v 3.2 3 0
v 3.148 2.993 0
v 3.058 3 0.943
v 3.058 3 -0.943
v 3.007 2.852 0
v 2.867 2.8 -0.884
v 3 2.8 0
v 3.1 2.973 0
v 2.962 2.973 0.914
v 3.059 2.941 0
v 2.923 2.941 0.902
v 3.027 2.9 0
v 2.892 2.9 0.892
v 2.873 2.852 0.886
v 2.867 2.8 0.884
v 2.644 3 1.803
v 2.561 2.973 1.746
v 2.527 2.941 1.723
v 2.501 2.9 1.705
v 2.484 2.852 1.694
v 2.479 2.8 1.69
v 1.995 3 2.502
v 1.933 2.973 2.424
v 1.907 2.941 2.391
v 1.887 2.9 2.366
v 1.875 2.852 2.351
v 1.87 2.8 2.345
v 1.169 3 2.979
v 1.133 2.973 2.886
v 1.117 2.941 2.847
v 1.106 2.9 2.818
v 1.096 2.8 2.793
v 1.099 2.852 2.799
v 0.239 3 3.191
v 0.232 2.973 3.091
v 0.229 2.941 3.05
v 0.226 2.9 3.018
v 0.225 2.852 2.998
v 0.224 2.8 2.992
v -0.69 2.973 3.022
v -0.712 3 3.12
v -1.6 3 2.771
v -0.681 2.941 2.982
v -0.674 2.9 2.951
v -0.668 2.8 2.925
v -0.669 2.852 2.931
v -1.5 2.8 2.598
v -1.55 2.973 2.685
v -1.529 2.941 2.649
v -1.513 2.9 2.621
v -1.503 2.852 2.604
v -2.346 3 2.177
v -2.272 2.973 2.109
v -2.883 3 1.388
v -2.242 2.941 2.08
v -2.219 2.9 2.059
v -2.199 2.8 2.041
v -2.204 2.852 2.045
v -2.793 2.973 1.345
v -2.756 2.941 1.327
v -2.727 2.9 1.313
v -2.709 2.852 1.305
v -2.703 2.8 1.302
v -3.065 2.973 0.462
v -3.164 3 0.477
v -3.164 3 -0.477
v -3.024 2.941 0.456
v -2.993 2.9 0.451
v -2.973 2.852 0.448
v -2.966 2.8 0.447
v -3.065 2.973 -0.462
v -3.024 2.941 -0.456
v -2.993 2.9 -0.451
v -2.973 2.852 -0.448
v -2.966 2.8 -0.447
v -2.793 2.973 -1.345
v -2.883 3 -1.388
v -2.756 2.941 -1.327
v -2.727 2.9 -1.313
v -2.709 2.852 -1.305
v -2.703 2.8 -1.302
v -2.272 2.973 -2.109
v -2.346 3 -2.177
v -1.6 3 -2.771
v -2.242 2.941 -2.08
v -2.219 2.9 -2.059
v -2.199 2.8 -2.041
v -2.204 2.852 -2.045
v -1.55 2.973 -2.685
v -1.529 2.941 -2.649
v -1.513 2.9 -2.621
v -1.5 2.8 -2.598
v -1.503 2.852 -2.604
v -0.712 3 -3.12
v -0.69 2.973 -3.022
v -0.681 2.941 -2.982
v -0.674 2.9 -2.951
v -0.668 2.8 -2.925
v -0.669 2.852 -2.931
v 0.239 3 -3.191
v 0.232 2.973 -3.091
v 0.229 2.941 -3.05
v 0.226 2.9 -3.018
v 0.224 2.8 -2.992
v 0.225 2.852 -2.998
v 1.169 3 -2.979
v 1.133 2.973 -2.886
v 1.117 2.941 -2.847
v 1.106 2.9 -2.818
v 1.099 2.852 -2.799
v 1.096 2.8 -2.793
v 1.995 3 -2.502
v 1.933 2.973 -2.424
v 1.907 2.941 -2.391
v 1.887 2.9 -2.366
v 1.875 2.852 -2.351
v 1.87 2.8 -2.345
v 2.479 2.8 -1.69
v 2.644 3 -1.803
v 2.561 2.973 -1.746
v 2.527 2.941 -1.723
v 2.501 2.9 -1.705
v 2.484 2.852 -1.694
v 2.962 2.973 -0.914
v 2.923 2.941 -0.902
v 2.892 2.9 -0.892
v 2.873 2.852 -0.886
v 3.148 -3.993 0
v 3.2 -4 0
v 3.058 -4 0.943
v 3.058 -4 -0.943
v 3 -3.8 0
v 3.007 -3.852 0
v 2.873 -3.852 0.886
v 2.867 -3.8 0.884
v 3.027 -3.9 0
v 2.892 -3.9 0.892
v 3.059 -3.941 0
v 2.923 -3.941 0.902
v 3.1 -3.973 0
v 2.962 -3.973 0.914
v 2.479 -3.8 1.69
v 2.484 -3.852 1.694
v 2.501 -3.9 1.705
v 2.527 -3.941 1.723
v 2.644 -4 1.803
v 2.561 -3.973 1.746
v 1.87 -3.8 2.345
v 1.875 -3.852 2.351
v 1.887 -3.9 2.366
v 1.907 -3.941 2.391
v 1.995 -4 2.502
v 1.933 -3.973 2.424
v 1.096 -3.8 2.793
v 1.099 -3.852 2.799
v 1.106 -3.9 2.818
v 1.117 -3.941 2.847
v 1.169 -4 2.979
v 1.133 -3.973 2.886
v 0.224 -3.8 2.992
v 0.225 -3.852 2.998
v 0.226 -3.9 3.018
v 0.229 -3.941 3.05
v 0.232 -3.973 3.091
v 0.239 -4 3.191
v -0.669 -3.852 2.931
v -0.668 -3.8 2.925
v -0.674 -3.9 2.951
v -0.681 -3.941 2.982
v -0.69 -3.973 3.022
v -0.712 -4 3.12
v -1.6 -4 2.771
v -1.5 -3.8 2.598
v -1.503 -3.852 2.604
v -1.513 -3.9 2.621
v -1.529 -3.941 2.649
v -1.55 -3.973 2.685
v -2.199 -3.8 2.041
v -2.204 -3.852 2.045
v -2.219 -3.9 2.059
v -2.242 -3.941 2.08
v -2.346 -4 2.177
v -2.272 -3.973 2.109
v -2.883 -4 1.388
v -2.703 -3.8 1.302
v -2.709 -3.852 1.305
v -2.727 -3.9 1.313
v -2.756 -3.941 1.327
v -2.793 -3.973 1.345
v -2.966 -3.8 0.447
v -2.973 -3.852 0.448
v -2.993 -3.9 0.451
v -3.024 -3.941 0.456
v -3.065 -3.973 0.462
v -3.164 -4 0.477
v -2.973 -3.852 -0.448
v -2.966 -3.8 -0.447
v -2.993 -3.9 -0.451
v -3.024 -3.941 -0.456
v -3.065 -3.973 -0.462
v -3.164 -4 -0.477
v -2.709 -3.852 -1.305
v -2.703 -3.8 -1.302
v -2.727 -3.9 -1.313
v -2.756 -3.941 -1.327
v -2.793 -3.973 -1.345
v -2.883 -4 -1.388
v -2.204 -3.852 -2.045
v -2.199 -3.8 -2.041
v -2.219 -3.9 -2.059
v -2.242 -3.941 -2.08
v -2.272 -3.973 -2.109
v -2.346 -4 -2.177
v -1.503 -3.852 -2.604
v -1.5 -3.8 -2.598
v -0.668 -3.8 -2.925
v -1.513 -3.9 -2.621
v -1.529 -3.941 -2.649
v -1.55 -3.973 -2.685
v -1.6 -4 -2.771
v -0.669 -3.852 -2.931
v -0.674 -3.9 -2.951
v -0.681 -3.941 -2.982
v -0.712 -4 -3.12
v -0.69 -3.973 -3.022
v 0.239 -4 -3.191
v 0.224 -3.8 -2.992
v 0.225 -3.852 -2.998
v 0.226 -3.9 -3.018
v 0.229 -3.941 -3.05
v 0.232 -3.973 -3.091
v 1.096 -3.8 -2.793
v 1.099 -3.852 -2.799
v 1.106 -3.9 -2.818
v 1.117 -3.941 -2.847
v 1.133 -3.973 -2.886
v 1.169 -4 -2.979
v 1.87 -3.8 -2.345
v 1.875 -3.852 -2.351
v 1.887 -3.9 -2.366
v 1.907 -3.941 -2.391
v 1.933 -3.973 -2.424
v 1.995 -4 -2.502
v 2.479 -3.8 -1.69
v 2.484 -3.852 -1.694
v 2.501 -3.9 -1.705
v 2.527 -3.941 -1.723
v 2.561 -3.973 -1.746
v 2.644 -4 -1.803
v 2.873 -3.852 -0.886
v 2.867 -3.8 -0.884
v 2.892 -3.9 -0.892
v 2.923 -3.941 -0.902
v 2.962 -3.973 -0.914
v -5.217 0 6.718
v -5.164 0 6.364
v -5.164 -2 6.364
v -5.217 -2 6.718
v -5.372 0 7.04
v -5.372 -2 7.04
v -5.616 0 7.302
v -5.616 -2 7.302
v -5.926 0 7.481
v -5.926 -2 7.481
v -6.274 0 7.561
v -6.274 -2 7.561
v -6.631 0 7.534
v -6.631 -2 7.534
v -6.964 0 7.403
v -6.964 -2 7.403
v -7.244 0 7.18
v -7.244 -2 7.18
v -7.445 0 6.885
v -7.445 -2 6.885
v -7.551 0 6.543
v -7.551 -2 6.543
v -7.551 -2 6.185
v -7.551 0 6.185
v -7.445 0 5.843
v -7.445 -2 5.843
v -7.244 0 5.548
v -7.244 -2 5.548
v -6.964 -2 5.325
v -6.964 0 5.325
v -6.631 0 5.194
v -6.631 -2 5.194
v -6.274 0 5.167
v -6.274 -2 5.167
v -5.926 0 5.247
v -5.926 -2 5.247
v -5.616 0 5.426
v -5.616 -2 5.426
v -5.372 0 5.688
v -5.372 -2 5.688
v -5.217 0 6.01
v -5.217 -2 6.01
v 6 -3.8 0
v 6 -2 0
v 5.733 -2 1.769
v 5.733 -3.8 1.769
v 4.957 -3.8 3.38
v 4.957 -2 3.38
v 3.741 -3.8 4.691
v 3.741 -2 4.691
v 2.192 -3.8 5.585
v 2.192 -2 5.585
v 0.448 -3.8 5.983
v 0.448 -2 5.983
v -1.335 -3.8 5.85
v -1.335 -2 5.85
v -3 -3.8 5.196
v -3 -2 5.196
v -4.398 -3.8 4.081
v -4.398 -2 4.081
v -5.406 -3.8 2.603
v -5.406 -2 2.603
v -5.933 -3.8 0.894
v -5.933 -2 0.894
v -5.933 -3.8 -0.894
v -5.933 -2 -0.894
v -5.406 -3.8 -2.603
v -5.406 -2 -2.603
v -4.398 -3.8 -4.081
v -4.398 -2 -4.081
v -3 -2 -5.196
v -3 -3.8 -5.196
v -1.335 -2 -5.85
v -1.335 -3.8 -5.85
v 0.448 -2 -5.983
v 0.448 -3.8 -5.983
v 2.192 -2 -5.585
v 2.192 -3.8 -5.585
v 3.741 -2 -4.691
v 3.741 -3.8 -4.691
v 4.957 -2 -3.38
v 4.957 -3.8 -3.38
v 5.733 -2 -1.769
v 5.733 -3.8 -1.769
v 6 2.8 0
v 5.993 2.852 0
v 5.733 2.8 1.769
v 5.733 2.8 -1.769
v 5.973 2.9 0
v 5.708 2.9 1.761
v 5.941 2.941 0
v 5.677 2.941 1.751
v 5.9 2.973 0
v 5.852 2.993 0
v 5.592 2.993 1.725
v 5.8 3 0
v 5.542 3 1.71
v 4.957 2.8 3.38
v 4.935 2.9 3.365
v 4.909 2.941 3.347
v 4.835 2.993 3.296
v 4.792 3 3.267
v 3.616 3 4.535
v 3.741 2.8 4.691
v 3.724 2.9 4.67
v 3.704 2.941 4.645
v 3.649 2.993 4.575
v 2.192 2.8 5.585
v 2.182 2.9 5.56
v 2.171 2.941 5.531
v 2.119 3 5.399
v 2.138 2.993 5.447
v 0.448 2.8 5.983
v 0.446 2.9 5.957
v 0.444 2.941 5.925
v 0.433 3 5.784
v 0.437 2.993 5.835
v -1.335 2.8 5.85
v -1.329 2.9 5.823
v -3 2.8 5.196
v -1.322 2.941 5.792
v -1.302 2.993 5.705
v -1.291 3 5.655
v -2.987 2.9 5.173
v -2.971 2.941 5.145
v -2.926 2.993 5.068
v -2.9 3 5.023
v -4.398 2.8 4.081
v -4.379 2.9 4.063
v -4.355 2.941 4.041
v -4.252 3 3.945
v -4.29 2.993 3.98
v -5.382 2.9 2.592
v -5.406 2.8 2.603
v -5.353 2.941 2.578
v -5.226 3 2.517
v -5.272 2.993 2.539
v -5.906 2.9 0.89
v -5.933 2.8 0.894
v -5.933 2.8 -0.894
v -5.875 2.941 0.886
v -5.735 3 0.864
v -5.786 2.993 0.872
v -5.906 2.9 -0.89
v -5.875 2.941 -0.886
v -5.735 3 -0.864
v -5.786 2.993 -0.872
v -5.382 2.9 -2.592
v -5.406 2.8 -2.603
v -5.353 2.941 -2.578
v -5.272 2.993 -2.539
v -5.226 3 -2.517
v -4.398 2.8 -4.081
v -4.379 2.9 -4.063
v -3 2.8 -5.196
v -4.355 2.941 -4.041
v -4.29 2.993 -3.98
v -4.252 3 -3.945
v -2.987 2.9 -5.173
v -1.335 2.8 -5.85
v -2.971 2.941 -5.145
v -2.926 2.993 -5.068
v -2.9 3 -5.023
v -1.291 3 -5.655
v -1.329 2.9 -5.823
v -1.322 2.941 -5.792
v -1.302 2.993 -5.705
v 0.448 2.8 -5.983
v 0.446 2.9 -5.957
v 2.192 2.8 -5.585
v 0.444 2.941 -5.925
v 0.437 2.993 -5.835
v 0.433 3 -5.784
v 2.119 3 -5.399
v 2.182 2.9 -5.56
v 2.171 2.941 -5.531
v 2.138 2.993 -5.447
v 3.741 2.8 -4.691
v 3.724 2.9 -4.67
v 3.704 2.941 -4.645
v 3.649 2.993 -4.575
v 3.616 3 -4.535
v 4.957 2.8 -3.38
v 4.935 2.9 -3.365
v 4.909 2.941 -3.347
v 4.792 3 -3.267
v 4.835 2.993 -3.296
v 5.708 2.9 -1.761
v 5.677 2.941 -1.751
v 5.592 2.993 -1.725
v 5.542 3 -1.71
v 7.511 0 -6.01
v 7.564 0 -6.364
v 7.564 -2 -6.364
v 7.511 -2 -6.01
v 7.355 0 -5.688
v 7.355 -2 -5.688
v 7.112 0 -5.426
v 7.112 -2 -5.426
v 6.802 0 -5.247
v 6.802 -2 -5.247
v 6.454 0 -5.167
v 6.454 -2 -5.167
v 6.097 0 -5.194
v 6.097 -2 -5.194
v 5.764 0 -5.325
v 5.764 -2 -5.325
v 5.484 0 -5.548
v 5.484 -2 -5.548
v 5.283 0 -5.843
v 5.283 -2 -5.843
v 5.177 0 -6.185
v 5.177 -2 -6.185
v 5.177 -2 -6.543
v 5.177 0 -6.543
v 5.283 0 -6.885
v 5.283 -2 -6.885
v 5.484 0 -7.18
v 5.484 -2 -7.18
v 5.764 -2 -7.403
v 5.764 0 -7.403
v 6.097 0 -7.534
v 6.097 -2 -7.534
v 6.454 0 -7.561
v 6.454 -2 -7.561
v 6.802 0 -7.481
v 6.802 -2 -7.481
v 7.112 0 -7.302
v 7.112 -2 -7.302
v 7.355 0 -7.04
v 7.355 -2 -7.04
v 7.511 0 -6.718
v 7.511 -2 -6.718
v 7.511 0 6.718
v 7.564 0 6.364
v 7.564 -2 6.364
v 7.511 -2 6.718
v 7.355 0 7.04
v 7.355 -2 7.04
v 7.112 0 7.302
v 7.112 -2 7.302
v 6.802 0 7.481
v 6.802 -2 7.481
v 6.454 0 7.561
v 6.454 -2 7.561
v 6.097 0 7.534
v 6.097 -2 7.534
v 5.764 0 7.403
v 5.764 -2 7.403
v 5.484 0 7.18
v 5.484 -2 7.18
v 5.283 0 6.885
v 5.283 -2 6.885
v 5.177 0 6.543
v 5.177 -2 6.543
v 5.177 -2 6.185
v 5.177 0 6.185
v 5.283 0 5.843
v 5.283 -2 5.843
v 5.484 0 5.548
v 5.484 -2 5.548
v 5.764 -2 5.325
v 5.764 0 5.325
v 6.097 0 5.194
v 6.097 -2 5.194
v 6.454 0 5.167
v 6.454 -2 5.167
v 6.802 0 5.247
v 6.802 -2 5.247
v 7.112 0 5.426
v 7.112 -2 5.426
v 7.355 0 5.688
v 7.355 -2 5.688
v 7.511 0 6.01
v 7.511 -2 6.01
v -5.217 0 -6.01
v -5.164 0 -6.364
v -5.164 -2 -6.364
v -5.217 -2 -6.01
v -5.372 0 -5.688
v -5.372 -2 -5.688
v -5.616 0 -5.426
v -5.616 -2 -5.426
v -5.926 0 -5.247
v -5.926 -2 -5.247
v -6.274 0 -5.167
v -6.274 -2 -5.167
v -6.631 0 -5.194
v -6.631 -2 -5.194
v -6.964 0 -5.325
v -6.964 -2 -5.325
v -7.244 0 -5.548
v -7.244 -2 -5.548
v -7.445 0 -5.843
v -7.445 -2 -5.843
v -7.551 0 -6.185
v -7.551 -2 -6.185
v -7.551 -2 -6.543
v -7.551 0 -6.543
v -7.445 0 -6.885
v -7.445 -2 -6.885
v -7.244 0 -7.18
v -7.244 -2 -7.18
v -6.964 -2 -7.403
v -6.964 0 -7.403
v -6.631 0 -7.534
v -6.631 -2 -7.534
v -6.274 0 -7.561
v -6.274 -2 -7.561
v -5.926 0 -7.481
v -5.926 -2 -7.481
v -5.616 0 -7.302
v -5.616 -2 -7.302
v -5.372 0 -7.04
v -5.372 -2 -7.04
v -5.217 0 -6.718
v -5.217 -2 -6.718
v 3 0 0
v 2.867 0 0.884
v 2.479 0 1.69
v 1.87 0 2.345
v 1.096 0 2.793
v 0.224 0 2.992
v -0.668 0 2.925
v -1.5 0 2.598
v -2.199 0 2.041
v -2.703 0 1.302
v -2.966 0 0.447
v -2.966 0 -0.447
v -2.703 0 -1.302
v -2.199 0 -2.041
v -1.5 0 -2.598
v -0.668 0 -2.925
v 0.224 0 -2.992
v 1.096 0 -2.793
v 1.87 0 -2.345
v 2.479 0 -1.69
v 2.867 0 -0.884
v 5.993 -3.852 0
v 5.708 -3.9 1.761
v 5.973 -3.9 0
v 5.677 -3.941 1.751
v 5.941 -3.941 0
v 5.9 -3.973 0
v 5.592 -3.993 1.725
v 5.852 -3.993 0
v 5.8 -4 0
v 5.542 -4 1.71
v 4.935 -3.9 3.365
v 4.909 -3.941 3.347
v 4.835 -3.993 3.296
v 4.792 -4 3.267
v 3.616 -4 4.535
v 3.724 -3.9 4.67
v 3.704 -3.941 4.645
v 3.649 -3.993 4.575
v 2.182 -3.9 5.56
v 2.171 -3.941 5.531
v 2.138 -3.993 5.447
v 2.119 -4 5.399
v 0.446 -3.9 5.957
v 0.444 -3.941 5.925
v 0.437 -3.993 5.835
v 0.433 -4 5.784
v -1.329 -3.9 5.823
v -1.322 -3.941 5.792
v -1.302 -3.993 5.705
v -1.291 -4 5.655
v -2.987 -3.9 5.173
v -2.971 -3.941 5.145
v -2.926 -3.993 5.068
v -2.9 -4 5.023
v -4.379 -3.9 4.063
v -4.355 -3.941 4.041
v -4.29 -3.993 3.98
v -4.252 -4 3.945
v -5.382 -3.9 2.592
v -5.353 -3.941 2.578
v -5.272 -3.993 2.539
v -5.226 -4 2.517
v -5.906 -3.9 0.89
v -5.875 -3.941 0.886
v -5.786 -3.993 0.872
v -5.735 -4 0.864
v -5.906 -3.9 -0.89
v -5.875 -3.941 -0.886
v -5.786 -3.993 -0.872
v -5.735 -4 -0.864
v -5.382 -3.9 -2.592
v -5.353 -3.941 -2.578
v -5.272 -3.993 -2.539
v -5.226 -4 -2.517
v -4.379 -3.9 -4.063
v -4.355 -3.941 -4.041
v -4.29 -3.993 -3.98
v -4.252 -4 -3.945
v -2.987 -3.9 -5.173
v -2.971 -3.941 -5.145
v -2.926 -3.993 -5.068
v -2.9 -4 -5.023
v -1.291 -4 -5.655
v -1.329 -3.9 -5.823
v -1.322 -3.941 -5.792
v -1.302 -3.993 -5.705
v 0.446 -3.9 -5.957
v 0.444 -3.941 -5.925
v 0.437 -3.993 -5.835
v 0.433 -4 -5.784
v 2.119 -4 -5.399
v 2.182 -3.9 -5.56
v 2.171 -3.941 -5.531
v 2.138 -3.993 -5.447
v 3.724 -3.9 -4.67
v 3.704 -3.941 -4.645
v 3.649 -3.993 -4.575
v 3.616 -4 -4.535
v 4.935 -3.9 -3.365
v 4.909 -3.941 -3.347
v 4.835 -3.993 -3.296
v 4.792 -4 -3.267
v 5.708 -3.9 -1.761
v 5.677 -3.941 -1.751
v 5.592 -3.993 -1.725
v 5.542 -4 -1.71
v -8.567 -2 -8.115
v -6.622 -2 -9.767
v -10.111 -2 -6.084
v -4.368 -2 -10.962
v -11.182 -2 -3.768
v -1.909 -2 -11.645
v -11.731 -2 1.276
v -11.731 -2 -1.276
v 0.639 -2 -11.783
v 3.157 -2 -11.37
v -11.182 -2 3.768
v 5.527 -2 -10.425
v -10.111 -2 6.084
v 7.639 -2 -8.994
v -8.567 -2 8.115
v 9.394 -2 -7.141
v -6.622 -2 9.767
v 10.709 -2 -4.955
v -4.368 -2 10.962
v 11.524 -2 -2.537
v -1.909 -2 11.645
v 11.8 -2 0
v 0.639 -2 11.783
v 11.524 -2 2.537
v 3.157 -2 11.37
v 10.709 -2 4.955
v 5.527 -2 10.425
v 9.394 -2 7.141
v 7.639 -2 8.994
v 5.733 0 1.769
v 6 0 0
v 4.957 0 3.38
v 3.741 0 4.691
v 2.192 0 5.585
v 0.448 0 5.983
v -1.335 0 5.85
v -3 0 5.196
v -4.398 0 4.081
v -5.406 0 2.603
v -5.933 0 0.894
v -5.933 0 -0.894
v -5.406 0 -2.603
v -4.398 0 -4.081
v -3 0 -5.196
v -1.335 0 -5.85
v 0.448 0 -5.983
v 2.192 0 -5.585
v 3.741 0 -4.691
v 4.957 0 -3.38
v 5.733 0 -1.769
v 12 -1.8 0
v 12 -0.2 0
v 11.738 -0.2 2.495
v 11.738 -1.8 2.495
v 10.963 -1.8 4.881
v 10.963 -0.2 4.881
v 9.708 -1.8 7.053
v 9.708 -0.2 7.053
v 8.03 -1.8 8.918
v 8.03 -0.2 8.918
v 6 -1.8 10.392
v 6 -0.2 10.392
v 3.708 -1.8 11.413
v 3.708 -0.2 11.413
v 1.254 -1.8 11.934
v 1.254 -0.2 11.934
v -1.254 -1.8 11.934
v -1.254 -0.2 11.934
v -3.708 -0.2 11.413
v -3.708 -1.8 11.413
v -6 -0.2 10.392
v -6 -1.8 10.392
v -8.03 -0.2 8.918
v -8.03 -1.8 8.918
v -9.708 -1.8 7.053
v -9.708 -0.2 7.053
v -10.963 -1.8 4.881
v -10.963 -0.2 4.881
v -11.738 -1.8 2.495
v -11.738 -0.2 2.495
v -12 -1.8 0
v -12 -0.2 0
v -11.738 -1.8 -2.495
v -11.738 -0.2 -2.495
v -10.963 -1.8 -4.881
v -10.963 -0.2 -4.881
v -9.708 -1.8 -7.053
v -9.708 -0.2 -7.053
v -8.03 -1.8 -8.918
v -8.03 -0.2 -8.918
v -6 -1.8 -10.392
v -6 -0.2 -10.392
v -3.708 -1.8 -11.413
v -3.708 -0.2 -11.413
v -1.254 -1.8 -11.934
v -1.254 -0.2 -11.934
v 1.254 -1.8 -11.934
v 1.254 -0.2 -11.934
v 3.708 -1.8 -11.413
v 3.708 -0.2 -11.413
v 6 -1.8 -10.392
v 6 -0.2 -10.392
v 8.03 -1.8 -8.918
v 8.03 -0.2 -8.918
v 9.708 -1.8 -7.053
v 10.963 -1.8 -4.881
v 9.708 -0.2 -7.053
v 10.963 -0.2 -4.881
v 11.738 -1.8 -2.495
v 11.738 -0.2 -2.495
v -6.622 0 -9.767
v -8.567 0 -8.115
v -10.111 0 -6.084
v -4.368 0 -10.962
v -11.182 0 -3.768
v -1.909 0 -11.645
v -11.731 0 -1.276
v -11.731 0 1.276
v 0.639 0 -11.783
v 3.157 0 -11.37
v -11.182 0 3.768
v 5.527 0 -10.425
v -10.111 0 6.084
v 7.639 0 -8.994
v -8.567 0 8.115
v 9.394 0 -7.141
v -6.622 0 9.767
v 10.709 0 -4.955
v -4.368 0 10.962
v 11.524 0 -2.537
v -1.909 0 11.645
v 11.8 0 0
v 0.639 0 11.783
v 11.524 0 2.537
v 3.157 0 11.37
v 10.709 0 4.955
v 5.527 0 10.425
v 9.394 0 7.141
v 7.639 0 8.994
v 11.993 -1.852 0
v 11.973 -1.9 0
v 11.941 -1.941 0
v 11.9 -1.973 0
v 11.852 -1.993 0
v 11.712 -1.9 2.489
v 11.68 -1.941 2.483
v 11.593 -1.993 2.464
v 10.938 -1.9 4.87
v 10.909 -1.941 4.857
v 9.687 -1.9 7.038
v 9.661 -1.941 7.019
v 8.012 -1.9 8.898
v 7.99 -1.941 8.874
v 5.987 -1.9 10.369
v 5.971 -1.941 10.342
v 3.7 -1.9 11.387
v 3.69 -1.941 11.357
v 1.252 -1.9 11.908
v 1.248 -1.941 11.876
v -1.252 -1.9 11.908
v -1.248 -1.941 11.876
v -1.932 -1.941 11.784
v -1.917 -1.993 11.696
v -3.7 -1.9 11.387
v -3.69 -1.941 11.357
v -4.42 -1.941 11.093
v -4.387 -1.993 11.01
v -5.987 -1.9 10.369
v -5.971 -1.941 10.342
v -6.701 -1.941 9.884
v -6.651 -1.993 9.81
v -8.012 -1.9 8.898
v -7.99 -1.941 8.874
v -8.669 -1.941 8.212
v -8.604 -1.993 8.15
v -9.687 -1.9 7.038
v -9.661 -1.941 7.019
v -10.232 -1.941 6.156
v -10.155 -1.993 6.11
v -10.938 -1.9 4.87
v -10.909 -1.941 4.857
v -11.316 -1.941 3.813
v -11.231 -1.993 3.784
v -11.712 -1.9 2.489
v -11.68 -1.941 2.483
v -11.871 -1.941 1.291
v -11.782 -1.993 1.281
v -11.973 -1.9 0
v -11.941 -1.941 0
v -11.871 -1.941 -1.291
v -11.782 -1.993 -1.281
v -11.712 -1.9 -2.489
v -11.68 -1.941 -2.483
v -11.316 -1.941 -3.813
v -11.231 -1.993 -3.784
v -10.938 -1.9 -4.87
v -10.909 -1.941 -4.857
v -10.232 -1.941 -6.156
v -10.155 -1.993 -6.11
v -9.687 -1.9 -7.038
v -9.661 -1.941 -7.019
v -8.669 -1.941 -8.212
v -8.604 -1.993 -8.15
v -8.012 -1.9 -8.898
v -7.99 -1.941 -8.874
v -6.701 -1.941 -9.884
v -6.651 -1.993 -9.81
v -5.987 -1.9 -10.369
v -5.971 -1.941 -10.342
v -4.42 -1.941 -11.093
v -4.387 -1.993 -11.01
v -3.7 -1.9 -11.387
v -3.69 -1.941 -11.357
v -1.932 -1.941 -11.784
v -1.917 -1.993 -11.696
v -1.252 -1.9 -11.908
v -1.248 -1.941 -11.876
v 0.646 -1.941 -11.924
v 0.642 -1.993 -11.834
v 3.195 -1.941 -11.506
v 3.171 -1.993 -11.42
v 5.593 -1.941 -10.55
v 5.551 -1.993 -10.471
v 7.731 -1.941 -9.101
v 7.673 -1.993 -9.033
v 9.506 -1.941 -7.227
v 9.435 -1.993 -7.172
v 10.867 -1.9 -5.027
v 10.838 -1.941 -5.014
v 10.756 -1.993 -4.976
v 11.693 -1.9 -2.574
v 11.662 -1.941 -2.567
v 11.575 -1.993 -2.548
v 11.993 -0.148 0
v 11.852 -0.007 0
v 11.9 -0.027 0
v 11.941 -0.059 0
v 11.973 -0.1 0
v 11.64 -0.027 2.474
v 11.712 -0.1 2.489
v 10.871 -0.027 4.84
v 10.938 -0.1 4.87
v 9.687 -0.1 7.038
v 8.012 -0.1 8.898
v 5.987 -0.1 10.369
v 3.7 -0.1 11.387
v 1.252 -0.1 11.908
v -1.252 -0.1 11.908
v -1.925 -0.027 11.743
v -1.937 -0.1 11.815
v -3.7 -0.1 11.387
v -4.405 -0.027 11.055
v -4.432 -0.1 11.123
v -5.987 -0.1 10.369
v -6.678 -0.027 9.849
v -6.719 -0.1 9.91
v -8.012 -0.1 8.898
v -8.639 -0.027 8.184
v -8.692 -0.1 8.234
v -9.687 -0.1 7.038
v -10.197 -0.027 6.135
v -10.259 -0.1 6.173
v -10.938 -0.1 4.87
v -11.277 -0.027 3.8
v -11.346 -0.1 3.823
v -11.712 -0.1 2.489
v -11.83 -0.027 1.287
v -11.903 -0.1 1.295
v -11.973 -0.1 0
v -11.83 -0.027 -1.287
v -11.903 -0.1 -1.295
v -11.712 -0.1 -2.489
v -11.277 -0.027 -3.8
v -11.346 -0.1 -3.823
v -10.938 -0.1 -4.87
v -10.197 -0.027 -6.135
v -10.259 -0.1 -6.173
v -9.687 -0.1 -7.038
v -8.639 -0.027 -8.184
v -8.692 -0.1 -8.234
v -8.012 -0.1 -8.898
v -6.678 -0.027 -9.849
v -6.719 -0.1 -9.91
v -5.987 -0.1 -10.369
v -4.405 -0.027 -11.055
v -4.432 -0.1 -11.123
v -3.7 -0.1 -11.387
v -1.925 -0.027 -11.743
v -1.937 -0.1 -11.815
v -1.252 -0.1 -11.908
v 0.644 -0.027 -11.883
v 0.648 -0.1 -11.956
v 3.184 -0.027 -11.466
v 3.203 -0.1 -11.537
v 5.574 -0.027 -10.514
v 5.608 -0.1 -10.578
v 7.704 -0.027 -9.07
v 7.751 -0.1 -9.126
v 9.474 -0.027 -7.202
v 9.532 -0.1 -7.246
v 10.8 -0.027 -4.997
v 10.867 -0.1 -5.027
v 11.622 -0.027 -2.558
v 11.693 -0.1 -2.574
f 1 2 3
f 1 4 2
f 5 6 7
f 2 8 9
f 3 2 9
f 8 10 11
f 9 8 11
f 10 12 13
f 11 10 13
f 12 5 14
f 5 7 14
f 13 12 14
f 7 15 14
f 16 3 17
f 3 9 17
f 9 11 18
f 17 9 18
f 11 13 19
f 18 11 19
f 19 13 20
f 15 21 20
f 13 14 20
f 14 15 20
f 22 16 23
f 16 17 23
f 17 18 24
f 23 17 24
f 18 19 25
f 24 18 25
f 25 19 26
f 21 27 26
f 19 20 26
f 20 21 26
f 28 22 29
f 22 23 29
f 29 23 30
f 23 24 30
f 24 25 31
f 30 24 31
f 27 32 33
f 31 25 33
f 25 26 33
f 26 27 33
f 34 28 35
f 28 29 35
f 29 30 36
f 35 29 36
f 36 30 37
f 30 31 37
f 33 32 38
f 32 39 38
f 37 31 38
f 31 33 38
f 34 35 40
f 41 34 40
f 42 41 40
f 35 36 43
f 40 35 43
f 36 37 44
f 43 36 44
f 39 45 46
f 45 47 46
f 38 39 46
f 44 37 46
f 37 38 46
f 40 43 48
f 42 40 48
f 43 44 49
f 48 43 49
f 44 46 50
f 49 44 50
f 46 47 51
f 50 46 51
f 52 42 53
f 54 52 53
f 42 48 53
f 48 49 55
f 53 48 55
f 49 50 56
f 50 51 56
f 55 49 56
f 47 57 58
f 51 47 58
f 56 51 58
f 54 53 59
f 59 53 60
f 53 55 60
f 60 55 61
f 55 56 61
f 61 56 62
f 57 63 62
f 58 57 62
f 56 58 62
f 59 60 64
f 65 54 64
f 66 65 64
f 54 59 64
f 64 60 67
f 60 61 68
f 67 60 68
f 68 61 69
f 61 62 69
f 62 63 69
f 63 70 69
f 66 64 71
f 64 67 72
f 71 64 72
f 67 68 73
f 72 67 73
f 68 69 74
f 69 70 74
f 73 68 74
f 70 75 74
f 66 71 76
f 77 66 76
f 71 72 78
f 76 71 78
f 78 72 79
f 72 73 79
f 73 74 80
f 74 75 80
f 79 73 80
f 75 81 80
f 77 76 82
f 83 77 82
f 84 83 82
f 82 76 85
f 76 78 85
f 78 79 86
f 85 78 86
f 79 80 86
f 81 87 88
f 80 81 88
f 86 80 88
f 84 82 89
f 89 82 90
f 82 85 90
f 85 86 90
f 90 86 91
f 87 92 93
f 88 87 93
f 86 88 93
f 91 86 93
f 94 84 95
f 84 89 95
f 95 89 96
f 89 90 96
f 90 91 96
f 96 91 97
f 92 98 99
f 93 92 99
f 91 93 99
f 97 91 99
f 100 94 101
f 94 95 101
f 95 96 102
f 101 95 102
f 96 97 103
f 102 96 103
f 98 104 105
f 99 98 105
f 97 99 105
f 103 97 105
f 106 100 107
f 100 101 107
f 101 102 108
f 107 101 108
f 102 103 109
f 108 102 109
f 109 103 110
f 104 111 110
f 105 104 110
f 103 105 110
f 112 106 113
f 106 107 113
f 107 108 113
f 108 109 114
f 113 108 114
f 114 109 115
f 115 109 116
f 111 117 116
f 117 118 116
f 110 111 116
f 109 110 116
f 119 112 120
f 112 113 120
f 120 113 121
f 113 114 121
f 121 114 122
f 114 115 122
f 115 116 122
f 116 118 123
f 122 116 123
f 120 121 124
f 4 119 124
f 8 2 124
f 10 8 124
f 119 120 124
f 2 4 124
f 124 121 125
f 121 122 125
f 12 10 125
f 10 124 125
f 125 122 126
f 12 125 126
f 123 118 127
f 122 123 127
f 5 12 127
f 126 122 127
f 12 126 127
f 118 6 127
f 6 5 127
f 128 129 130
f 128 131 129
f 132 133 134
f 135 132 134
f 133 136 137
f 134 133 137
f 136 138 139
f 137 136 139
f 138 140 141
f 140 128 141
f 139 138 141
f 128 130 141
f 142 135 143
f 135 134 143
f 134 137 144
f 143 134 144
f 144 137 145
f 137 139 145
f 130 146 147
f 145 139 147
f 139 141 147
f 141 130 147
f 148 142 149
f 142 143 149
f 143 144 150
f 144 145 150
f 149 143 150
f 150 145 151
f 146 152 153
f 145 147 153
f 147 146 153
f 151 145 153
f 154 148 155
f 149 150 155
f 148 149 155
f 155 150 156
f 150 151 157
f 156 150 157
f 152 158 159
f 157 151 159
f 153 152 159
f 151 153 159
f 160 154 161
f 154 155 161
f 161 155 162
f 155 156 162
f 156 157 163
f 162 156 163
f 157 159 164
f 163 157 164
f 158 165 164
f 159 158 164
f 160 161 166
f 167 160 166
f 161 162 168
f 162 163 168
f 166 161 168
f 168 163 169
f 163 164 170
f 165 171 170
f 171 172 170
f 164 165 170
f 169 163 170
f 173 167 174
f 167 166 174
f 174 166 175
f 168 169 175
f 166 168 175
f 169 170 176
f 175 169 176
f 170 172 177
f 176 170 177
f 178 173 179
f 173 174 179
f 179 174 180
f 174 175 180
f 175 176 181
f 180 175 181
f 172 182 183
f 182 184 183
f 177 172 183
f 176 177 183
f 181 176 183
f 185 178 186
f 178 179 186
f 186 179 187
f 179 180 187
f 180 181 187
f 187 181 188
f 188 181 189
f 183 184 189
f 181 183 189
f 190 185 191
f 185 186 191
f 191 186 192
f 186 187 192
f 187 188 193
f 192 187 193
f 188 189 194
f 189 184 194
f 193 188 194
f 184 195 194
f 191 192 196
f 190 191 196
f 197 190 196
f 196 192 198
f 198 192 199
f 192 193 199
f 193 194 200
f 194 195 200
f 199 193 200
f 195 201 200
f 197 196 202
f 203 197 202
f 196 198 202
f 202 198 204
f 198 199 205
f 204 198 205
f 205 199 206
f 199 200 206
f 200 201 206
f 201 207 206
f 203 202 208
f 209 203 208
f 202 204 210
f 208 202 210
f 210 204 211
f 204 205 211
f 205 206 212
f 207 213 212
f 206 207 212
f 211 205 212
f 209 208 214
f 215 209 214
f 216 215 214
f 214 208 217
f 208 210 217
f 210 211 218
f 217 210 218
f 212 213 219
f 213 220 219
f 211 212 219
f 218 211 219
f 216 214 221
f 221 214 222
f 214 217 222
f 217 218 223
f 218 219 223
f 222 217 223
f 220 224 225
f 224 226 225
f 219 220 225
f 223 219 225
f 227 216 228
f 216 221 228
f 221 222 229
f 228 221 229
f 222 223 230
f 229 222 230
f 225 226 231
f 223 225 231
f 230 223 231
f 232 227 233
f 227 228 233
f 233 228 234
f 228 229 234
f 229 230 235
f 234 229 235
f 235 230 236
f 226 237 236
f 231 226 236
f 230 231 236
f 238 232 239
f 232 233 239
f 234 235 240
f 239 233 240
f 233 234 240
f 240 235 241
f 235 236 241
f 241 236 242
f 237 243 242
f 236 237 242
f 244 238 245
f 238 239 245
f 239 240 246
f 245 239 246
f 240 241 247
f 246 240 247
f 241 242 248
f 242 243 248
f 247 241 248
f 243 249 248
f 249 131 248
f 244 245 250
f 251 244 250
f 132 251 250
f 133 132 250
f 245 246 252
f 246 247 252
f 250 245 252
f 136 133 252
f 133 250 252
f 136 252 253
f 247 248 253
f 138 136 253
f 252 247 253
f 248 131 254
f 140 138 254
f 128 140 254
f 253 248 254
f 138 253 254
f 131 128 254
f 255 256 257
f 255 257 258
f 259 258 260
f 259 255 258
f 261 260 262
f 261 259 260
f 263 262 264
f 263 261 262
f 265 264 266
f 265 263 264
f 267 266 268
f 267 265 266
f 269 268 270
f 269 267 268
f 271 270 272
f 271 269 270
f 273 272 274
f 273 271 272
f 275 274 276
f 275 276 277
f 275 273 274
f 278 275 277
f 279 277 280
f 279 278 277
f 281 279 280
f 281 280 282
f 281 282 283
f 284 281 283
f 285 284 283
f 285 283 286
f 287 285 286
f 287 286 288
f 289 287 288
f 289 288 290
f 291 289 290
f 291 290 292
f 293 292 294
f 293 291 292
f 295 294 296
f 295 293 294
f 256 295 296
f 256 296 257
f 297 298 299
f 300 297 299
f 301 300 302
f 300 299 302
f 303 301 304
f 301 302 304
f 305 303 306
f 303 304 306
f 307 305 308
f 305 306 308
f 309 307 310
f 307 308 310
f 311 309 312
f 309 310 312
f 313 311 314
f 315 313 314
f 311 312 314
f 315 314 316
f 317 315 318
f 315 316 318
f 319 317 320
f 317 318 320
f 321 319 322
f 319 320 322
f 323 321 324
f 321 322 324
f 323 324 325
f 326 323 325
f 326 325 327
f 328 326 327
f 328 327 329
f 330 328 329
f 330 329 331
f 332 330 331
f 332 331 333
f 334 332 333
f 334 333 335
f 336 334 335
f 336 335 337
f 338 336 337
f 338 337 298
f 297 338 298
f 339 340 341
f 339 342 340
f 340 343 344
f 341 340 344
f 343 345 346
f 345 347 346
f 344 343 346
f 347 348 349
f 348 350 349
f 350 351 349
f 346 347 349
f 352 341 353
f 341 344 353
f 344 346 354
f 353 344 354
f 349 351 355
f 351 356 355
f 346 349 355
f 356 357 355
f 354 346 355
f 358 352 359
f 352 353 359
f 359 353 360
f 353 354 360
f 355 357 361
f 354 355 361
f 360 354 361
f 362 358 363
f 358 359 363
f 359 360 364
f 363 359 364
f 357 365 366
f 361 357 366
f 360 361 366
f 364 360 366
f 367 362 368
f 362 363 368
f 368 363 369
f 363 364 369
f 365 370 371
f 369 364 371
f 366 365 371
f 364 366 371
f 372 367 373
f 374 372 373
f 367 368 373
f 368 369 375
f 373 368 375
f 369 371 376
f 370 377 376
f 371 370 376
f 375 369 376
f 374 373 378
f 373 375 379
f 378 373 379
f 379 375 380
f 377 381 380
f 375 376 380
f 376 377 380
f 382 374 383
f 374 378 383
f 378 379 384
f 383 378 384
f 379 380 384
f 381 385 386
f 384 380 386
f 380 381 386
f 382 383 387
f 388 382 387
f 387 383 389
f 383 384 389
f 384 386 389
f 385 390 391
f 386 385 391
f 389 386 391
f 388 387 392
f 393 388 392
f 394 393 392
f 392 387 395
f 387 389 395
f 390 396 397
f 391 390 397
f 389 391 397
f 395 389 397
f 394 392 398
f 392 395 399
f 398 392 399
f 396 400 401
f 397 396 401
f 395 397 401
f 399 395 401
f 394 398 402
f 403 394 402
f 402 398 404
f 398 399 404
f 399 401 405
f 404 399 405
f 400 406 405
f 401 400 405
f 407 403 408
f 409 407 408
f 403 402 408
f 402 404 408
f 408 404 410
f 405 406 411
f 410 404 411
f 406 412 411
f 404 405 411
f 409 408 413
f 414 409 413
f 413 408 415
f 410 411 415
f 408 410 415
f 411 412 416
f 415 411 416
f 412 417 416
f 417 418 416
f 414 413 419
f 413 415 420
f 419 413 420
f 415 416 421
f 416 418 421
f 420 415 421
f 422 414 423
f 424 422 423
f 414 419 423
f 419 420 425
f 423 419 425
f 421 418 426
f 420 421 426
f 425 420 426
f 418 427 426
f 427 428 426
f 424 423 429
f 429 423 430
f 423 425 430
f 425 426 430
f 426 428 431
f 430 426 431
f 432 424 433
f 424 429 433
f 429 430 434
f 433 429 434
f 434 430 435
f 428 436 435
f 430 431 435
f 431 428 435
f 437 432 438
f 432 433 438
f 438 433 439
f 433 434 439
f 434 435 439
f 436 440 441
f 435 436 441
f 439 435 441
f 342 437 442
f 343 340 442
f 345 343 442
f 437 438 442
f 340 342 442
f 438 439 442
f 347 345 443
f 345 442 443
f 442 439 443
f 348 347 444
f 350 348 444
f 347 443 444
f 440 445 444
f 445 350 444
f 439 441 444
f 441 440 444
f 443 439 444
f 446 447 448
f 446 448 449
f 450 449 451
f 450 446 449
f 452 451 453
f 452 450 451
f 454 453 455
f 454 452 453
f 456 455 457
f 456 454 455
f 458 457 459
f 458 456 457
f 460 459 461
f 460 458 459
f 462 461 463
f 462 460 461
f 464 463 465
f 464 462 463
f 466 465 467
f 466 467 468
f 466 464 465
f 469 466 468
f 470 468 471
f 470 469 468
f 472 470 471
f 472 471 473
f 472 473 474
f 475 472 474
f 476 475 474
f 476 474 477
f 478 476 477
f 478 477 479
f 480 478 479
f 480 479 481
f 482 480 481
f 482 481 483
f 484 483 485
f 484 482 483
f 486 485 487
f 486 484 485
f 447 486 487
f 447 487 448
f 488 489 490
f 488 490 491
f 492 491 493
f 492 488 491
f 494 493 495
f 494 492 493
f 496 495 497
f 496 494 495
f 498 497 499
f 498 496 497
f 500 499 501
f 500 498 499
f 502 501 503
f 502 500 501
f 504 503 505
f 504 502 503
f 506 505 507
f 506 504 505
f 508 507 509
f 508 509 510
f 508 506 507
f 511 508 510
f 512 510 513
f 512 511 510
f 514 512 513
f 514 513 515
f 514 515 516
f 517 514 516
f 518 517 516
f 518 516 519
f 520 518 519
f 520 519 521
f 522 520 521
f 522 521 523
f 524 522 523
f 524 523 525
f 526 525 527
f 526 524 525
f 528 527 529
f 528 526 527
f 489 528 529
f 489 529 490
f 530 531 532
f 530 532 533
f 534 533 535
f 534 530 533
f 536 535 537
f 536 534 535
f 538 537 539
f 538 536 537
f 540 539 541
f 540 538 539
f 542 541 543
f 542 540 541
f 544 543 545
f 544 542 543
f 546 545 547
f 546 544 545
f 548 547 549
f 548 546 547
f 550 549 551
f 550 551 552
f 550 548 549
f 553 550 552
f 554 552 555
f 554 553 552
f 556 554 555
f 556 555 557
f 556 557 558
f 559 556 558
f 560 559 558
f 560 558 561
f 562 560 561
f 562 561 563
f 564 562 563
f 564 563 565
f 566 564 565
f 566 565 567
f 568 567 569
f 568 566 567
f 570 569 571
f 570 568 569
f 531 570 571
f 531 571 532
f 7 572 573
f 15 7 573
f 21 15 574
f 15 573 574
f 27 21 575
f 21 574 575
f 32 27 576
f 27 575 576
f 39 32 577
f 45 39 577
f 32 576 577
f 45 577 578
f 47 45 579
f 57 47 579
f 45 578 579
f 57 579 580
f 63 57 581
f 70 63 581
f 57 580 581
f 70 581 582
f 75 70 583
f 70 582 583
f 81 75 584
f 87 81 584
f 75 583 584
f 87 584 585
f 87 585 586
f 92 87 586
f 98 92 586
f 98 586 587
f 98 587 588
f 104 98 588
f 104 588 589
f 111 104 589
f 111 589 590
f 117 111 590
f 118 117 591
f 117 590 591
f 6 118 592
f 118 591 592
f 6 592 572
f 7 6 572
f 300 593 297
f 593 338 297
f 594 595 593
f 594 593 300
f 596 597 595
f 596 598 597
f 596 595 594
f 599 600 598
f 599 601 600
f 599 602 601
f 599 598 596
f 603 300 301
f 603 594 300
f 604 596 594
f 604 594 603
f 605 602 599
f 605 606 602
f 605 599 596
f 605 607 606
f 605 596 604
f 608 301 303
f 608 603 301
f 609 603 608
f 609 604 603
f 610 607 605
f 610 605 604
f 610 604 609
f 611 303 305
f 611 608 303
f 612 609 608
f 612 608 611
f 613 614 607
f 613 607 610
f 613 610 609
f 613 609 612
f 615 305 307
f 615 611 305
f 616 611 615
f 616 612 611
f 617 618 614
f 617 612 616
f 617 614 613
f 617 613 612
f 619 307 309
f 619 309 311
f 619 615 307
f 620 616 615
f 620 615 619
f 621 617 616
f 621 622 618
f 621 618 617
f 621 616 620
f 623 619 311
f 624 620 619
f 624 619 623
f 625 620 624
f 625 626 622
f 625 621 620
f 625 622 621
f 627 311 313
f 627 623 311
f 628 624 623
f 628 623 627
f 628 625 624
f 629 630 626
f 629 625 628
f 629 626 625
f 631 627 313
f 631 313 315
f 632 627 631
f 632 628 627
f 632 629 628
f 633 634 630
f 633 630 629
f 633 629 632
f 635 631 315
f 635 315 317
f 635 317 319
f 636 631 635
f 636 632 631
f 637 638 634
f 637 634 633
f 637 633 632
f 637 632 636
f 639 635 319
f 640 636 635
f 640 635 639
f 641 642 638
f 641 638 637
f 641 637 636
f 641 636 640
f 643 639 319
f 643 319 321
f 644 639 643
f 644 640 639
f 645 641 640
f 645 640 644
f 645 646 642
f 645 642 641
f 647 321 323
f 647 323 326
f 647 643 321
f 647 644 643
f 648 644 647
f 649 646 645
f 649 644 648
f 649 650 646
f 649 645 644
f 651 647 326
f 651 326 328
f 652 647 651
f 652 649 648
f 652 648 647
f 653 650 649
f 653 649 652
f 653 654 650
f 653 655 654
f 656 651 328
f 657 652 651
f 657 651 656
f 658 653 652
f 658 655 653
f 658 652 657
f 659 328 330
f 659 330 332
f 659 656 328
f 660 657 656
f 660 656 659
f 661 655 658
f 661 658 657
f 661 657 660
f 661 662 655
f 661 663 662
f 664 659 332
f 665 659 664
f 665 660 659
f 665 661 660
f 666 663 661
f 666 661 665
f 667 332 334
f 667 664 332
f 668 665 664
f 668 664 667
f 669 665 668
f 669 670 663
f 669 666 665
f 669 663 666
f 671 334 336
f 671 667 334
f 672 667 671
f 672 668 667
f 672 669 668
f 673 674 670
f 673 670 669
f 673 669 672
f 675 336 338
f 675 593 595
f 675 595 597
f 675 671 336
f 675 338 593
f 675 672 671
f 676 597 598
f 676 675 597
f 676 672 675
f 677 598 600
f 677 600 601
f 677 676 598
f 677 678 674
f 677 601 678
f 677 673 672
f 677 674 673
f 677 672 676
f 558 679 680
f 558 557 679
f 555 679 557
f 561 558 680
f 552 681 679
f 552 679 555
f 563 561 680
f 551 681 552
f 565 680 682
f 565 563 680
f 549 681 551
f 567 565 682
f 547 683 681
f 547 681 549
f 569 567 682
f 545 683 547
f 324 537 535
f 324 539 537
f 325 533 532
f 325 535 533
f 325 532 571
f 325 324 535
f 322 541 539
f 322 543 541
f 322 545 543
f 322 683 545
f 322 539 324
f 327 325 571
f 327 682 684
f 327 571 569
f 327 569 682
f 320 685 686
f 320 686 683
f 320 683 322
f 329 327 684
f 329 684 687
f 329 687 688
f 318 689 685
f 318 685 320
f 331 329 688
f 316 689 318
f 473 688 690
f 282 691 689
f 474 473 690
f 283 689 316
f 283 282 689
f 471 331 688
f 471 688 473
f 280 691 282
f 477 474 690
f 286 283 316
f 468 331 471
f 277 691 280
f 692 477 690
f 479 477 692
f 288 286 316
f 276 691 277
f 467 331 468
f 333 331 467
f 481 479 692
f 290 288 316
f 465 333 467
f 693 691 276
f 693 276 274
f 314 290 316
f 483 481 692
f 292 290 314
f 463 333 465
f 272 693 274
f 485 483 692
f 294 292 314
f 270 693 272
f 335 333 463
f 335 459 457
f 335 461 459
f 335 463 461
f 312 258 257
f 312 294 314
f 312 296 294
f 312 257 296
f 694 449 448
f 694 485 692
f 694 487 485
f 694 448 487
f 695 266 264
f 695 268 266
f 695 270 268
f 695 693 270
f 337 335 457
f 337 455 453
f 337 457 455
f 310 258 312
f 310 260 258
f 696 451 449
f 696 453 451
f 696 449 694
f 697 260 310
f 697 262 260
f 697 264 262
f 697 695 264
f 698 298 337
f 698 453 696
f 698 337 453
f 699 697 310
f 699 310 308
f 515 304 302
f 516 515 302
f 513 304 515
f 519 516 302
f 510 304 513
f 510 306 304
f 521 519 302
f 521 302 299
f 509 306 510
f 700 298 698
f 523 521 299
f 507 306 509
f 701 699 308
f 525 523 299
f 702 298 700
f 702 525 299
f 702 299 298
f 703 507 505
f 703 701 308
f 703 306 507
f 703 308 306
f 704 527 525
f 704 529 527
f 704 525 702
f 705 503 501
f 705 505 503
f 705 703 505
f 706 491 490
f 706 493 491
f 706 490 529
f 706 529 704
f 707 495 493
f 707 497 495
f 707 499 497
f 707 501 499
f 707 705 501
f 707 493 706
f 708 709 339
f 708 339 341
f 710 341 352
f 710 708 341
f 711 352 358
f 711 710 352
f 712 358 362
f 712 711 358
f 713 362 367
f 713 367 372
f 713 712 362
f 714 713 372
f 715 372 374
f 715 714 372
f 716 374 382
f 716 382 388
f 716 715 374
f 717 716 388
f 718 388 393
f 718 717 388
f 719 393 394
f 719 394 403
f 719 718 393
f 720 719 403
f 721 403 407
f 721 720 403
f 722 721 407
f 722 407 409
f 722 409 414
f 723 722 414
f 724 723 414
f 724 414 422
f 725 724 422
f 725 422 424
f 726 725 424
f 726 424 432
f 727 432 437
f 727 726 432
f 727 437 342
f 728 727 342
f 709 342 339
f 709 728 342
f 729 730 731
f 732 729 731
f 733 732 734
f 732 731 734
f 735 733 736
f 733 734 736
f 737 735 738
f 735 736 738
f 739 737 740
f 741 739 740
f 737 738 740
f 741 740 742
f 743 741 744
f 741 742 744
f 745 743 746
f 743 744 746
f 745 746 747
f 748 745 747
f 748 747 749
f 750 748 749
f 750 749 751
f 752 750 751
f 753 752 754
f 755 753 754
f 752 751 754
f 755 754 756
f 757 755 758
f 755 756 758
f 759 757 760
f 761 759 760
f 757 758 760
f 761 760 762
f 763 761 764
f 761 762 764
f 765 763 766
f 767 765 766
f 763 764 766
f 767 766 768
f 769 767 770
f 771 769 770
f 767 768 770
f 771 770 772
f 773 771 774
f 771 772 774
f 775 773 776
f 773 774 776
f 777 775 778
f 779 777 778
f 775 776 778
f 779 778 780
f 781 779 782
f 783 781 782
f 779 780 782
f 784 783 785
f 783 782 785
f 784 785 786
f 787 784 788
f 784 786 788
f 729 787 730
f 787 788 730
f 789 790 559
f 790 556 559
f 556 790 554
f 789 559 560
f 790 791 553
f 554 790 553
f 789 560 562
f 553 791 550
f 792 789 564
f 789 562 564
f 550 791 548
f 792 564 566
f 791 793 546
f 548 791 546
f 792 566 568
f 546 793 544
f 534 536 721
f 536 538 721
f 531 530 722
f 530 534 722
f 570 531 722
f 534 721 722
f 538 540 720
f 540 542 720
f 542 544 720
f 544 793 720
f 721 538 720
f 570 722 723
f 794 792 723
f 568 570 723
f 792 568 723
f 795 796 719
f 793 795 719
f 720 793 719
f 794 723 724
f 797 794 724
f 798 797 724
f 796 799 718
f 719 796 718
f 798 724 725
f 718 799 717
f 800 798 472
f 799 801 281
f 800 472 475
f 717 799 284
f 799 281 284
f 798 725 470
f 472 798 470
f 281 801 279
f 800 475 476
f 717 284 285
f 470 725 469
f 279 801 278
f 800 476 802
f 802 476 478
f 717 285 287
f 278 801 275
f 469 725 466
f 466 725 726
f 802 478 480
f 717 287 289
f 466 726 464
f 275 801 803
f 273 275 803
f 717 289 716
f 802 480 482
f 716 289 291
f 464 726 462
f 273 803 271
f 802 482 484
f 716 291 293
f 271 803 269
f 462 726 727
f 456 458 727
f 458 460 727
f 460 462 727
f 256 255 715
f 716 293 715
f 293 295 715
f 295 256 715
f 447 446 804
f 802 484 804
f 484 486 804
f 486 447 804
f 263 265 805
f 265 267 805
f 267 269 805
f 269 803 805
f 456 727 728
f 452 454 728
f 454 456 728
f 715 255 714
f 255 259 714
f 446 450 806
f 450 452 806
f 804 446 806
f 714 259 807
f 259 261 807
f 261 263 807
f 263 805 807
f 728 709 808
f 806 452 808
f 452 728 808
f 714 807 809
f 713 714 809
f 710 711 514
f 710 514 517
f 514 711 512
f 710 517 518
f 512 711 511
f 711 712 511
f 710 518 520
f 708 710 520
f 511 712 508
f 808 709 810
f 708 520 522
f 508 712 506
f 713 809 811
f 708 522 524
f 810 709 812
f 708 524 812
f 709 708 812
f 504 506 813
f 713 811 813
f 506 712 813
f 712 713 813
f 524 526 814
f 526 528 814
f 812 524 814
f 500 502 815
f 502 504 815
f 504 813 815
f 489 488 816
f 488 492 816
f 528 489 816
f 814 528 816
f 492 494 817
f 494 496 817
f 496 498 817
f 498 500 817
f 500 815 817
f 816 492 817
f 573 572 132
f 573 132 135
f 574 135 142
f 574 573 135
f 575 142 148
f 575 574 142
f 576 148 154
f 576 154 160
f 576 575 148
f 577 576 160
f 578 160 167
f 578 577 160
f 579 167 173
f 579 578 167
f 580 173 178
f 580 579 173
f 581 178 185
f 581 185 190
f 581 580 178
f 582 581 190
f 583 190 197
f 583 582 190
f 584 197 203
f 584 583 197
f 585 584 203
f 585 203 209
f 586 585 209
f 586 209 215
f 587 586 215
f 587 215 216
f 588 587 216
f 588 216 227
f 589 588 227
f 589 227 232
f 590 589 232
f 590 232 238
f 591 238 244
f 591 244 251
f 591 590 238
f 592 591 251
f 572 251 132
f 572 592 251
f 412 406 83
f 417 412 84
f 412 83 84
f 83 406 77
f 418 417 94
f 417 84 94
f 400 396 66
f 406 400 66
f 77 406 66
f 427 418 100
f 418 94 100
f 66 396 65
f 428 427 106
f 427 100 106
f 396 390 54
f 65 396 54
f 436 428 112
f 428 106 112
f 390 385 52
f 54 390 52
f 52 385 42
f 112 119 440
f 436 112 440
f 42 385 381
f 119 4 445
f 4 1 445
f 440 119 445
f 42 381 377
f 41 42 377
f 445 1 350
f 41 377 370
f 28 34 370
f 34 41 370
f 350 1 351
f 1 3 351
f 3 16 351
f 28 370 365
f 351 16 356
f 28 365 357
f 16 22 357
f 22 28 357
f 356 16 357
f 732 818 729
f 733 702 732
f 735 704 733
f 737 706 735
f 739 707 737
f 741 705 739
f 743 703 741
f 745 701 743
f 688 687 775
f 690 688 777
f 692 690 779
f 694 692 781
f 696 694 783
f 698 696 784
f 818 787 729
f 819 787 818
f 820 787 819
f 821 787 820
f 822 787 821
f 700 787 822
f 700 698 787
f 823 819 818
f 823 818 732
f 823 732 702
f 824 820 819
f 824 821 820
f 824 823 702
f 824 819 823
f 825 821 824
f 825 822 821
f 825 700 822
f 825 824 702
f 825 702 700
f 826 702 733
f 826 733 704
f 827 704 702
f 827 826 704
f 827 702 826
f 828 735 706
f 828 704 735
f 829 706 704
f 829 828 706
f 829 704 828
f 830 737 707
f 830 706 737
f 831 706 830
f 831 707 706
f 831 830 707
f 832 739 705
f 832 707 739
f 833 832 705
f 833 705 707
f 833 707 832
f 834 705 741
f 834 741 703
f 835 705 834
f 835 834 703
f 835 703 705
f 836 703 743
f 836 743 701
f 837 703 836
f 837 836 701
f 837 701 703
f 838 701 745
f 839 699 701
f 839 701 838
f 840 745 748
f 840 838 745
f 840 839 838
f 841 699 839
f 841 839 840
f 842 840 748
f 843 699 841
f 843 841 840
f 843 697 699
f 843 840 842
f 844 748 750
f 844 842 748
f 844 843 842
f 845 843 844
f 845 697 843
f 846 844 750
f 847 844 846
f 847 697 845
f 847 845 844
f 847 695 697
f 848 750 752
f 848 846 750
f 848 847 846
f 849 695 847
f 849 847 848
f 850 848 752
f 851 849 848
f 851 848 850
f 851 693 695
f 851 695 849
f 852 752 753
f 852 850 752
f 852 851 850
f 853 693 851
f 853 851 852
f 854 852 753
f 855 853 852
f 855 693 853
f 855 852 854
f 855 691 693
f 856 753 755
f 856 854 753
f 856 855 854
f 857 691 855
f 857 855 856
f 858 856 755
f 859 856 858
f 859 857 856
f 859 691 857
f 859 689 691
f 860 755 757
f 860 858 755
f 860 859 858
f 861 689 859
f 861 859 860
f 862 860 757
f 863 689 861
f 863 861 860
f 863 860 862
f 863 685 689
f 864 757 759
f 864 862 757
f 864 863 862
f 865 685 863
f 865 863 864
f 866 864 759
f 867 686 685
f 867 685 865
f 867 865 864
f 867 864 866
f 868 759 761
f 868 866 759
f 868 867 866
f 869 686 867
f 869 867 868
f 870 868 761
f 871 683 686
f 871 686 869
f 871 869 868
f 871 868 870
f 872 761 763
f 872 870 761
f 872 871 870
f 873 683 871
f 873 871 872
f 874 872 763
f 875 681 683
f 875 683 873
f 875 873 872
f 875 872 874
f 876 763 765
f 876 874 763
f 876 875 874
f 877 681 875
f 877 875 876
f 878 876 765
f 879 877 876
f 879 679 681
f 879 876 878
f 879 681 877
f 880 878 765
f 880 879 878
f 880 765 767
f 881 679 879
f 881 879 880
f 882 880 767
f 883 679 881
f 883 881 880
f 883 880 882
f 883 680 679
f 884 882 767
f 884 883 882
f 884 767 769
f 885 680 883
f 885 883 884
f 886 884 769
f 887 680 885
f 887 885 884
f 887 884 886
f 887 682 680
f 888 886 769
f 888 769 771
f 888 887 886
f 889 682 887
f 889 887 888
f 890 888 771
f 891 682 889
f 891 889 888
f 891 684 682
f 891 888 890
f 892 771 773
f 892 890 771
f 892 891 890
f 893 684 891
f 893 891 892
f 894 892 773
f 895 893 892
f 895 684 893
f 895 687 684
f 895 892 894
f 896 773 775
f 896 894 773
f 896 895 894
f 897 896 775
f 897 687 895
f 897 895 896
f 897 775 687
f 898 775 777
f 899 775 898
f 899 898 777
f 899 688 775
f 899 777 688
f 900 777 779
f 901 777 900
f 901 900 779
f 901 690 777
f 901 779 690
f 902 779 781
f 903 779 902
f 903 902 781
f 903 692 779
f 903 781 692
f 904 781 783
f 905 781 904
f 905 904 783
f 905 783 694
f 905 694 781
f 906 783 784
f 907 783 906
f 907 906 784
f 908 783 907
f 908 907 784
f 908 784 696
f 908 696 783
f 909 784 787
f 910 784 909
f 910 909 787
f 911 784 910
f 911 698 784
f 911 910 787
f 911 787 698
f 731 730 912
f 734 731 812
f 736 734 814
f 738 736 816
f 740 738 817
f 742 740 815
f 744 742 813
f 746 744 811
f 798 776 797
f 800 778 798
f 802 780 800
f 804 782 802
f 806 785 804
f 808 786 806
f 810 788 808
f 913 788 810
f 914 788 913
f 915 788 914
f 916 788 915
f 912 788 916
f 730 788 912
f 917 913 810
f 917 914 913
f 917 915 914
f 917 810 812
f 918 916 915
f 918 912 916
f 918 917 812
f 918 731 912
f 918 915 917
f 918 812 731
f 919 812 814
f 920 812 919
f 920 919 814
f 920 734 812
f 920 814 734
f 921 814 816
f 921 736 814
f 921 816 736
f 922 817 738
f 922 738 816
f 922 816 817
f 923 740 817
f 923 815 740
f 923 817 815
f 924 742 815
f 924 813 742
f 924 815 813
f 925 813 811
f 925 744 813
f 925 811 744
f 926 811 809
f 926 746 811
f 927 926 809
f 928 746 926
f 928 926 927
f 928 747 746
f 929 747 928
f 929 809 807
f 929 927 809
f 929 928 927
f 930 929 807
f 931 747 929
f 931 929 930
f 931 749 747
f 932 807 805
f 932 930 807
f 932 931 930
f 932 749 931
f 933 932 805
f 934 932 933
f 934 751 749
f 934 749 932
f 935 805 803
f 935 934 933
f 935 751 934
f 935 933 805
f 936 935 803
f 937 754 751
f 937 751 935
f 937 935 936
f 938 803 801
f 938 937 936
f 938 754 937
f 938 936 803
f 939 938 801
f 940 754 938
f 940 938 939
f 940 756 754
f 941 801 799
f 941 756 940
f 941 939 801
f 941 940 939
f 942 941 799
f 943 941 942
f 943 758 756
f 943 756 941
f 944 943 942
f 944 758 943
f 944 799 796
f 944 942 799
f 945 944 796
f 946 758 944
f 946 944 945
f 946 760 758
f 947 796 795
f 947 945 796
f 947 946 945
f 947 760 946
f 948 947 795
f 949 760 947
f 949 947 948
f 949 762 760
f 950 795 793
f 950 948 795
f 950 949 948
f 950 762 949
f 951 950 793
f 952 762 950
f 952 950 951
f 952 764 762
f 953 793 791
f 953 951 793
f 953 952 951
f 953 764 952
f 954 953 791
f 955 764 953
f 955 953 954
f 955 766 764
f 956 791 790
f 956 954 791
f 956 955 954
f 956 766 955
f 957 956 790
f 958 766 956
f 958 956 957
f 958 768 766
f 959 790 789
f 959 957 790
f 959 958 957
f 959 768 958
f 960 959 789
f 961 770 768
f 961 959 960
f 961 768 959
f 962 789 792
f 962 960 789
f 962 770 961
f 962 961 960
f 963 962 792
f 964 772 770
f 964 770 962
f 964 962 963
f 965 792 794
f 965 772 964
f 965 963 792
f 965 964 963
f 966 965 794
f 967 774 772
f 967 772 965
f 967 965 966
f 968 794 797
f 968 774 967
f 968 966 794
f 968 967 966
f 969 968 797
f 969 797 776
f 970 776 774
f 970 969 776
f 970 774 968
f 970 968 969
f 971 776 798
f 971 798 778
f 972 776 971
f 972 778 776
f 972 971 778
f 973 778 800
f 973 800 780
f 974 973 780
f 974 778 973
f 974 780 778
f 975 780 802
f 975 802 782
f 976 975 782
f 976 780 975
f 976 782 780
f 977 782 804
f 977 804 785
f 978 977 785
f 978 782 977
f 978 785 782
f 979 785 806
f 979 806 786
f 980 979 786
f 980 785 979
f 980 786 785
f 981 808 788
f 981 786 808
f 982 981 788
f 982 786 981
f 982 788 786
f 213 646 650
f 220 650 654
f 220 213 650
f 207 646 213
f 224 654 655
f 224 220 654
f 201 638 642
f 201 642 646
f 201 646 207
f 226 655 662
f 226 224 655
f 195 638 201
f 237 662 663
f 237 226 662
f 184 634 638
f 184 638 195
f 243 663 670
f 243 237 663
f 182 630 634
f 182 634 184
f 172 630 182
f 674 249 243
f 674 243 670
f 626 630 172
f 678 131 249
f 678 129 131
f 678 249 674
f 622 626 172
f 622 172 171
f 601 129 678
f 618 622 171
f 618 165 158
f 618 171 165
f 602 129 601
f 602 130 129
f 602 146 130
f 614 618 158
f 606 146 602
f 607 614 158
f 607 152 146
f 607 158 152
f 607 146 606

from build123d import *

# Parameters (mm, degrees)
F0_R     = 12
F0_R_2   = 1.2
F0_R_3   = 6
F1_DEPTH = 2
F0_R_4   = 3
F2_DEPTH = 4
F3_DEPTH = 3
F4_R     = 0.2


with BuildPart() as f1:
    # F0 (on Front) → F1 (new body)
    with BuildSketch(Plane.XZ):
        Circle(F0_R)
        with Locations((-6.363961, -6.363961)):
            Circle(F0_R_2, mode=Mode.SUBTRACT)
        with Locations((6.363961, -6.363961)):
            Circle(F0_R_2, mode=Mode.SUBTRACT)
        with Locations((-6.363961, 6.363961)):
            Circle(F0_R_2, mode=Mode.SUBTRACT)
        Circle(F0_R_3, mode=Mode.SUBTRACT)
        with Locations((6.363961, 6.363961)):
            Circle(F0_R_2, mode=Mode.SUBTRACT)
    extrude(amount=F1_DEPTH)

    # F0 (on Front) → F2 (join)
    with BuildSketch(Plane.XZ):
        Circle(F0_R_3)
        Circle(F0_R_4, mode=Mode.SUBTRACT)
    extrude(amount=F2_DEPTH)

    # F0 (on Front) → F3 (join)
    with BuildSketch(Plane.XZ):
        Circle(F0_R_3)
        Circle(F0_R_4, mode=Mode.SUBTRACT)
    extrude(amount=-F3_DEPTH)

    # F4
    f4_edges = [f1.edges().sort_by_distance(p)[0] for p in [
        (-3, -4, 0),
        (-6, -4, 0),
        (-12, -2, 0),
        (-12, 0, 0),
        (-6, 3, 0),
        (-3, 3, 0),
    ]]
    fillet(f4_edges, radius=F4_R)


solid = f1.part
